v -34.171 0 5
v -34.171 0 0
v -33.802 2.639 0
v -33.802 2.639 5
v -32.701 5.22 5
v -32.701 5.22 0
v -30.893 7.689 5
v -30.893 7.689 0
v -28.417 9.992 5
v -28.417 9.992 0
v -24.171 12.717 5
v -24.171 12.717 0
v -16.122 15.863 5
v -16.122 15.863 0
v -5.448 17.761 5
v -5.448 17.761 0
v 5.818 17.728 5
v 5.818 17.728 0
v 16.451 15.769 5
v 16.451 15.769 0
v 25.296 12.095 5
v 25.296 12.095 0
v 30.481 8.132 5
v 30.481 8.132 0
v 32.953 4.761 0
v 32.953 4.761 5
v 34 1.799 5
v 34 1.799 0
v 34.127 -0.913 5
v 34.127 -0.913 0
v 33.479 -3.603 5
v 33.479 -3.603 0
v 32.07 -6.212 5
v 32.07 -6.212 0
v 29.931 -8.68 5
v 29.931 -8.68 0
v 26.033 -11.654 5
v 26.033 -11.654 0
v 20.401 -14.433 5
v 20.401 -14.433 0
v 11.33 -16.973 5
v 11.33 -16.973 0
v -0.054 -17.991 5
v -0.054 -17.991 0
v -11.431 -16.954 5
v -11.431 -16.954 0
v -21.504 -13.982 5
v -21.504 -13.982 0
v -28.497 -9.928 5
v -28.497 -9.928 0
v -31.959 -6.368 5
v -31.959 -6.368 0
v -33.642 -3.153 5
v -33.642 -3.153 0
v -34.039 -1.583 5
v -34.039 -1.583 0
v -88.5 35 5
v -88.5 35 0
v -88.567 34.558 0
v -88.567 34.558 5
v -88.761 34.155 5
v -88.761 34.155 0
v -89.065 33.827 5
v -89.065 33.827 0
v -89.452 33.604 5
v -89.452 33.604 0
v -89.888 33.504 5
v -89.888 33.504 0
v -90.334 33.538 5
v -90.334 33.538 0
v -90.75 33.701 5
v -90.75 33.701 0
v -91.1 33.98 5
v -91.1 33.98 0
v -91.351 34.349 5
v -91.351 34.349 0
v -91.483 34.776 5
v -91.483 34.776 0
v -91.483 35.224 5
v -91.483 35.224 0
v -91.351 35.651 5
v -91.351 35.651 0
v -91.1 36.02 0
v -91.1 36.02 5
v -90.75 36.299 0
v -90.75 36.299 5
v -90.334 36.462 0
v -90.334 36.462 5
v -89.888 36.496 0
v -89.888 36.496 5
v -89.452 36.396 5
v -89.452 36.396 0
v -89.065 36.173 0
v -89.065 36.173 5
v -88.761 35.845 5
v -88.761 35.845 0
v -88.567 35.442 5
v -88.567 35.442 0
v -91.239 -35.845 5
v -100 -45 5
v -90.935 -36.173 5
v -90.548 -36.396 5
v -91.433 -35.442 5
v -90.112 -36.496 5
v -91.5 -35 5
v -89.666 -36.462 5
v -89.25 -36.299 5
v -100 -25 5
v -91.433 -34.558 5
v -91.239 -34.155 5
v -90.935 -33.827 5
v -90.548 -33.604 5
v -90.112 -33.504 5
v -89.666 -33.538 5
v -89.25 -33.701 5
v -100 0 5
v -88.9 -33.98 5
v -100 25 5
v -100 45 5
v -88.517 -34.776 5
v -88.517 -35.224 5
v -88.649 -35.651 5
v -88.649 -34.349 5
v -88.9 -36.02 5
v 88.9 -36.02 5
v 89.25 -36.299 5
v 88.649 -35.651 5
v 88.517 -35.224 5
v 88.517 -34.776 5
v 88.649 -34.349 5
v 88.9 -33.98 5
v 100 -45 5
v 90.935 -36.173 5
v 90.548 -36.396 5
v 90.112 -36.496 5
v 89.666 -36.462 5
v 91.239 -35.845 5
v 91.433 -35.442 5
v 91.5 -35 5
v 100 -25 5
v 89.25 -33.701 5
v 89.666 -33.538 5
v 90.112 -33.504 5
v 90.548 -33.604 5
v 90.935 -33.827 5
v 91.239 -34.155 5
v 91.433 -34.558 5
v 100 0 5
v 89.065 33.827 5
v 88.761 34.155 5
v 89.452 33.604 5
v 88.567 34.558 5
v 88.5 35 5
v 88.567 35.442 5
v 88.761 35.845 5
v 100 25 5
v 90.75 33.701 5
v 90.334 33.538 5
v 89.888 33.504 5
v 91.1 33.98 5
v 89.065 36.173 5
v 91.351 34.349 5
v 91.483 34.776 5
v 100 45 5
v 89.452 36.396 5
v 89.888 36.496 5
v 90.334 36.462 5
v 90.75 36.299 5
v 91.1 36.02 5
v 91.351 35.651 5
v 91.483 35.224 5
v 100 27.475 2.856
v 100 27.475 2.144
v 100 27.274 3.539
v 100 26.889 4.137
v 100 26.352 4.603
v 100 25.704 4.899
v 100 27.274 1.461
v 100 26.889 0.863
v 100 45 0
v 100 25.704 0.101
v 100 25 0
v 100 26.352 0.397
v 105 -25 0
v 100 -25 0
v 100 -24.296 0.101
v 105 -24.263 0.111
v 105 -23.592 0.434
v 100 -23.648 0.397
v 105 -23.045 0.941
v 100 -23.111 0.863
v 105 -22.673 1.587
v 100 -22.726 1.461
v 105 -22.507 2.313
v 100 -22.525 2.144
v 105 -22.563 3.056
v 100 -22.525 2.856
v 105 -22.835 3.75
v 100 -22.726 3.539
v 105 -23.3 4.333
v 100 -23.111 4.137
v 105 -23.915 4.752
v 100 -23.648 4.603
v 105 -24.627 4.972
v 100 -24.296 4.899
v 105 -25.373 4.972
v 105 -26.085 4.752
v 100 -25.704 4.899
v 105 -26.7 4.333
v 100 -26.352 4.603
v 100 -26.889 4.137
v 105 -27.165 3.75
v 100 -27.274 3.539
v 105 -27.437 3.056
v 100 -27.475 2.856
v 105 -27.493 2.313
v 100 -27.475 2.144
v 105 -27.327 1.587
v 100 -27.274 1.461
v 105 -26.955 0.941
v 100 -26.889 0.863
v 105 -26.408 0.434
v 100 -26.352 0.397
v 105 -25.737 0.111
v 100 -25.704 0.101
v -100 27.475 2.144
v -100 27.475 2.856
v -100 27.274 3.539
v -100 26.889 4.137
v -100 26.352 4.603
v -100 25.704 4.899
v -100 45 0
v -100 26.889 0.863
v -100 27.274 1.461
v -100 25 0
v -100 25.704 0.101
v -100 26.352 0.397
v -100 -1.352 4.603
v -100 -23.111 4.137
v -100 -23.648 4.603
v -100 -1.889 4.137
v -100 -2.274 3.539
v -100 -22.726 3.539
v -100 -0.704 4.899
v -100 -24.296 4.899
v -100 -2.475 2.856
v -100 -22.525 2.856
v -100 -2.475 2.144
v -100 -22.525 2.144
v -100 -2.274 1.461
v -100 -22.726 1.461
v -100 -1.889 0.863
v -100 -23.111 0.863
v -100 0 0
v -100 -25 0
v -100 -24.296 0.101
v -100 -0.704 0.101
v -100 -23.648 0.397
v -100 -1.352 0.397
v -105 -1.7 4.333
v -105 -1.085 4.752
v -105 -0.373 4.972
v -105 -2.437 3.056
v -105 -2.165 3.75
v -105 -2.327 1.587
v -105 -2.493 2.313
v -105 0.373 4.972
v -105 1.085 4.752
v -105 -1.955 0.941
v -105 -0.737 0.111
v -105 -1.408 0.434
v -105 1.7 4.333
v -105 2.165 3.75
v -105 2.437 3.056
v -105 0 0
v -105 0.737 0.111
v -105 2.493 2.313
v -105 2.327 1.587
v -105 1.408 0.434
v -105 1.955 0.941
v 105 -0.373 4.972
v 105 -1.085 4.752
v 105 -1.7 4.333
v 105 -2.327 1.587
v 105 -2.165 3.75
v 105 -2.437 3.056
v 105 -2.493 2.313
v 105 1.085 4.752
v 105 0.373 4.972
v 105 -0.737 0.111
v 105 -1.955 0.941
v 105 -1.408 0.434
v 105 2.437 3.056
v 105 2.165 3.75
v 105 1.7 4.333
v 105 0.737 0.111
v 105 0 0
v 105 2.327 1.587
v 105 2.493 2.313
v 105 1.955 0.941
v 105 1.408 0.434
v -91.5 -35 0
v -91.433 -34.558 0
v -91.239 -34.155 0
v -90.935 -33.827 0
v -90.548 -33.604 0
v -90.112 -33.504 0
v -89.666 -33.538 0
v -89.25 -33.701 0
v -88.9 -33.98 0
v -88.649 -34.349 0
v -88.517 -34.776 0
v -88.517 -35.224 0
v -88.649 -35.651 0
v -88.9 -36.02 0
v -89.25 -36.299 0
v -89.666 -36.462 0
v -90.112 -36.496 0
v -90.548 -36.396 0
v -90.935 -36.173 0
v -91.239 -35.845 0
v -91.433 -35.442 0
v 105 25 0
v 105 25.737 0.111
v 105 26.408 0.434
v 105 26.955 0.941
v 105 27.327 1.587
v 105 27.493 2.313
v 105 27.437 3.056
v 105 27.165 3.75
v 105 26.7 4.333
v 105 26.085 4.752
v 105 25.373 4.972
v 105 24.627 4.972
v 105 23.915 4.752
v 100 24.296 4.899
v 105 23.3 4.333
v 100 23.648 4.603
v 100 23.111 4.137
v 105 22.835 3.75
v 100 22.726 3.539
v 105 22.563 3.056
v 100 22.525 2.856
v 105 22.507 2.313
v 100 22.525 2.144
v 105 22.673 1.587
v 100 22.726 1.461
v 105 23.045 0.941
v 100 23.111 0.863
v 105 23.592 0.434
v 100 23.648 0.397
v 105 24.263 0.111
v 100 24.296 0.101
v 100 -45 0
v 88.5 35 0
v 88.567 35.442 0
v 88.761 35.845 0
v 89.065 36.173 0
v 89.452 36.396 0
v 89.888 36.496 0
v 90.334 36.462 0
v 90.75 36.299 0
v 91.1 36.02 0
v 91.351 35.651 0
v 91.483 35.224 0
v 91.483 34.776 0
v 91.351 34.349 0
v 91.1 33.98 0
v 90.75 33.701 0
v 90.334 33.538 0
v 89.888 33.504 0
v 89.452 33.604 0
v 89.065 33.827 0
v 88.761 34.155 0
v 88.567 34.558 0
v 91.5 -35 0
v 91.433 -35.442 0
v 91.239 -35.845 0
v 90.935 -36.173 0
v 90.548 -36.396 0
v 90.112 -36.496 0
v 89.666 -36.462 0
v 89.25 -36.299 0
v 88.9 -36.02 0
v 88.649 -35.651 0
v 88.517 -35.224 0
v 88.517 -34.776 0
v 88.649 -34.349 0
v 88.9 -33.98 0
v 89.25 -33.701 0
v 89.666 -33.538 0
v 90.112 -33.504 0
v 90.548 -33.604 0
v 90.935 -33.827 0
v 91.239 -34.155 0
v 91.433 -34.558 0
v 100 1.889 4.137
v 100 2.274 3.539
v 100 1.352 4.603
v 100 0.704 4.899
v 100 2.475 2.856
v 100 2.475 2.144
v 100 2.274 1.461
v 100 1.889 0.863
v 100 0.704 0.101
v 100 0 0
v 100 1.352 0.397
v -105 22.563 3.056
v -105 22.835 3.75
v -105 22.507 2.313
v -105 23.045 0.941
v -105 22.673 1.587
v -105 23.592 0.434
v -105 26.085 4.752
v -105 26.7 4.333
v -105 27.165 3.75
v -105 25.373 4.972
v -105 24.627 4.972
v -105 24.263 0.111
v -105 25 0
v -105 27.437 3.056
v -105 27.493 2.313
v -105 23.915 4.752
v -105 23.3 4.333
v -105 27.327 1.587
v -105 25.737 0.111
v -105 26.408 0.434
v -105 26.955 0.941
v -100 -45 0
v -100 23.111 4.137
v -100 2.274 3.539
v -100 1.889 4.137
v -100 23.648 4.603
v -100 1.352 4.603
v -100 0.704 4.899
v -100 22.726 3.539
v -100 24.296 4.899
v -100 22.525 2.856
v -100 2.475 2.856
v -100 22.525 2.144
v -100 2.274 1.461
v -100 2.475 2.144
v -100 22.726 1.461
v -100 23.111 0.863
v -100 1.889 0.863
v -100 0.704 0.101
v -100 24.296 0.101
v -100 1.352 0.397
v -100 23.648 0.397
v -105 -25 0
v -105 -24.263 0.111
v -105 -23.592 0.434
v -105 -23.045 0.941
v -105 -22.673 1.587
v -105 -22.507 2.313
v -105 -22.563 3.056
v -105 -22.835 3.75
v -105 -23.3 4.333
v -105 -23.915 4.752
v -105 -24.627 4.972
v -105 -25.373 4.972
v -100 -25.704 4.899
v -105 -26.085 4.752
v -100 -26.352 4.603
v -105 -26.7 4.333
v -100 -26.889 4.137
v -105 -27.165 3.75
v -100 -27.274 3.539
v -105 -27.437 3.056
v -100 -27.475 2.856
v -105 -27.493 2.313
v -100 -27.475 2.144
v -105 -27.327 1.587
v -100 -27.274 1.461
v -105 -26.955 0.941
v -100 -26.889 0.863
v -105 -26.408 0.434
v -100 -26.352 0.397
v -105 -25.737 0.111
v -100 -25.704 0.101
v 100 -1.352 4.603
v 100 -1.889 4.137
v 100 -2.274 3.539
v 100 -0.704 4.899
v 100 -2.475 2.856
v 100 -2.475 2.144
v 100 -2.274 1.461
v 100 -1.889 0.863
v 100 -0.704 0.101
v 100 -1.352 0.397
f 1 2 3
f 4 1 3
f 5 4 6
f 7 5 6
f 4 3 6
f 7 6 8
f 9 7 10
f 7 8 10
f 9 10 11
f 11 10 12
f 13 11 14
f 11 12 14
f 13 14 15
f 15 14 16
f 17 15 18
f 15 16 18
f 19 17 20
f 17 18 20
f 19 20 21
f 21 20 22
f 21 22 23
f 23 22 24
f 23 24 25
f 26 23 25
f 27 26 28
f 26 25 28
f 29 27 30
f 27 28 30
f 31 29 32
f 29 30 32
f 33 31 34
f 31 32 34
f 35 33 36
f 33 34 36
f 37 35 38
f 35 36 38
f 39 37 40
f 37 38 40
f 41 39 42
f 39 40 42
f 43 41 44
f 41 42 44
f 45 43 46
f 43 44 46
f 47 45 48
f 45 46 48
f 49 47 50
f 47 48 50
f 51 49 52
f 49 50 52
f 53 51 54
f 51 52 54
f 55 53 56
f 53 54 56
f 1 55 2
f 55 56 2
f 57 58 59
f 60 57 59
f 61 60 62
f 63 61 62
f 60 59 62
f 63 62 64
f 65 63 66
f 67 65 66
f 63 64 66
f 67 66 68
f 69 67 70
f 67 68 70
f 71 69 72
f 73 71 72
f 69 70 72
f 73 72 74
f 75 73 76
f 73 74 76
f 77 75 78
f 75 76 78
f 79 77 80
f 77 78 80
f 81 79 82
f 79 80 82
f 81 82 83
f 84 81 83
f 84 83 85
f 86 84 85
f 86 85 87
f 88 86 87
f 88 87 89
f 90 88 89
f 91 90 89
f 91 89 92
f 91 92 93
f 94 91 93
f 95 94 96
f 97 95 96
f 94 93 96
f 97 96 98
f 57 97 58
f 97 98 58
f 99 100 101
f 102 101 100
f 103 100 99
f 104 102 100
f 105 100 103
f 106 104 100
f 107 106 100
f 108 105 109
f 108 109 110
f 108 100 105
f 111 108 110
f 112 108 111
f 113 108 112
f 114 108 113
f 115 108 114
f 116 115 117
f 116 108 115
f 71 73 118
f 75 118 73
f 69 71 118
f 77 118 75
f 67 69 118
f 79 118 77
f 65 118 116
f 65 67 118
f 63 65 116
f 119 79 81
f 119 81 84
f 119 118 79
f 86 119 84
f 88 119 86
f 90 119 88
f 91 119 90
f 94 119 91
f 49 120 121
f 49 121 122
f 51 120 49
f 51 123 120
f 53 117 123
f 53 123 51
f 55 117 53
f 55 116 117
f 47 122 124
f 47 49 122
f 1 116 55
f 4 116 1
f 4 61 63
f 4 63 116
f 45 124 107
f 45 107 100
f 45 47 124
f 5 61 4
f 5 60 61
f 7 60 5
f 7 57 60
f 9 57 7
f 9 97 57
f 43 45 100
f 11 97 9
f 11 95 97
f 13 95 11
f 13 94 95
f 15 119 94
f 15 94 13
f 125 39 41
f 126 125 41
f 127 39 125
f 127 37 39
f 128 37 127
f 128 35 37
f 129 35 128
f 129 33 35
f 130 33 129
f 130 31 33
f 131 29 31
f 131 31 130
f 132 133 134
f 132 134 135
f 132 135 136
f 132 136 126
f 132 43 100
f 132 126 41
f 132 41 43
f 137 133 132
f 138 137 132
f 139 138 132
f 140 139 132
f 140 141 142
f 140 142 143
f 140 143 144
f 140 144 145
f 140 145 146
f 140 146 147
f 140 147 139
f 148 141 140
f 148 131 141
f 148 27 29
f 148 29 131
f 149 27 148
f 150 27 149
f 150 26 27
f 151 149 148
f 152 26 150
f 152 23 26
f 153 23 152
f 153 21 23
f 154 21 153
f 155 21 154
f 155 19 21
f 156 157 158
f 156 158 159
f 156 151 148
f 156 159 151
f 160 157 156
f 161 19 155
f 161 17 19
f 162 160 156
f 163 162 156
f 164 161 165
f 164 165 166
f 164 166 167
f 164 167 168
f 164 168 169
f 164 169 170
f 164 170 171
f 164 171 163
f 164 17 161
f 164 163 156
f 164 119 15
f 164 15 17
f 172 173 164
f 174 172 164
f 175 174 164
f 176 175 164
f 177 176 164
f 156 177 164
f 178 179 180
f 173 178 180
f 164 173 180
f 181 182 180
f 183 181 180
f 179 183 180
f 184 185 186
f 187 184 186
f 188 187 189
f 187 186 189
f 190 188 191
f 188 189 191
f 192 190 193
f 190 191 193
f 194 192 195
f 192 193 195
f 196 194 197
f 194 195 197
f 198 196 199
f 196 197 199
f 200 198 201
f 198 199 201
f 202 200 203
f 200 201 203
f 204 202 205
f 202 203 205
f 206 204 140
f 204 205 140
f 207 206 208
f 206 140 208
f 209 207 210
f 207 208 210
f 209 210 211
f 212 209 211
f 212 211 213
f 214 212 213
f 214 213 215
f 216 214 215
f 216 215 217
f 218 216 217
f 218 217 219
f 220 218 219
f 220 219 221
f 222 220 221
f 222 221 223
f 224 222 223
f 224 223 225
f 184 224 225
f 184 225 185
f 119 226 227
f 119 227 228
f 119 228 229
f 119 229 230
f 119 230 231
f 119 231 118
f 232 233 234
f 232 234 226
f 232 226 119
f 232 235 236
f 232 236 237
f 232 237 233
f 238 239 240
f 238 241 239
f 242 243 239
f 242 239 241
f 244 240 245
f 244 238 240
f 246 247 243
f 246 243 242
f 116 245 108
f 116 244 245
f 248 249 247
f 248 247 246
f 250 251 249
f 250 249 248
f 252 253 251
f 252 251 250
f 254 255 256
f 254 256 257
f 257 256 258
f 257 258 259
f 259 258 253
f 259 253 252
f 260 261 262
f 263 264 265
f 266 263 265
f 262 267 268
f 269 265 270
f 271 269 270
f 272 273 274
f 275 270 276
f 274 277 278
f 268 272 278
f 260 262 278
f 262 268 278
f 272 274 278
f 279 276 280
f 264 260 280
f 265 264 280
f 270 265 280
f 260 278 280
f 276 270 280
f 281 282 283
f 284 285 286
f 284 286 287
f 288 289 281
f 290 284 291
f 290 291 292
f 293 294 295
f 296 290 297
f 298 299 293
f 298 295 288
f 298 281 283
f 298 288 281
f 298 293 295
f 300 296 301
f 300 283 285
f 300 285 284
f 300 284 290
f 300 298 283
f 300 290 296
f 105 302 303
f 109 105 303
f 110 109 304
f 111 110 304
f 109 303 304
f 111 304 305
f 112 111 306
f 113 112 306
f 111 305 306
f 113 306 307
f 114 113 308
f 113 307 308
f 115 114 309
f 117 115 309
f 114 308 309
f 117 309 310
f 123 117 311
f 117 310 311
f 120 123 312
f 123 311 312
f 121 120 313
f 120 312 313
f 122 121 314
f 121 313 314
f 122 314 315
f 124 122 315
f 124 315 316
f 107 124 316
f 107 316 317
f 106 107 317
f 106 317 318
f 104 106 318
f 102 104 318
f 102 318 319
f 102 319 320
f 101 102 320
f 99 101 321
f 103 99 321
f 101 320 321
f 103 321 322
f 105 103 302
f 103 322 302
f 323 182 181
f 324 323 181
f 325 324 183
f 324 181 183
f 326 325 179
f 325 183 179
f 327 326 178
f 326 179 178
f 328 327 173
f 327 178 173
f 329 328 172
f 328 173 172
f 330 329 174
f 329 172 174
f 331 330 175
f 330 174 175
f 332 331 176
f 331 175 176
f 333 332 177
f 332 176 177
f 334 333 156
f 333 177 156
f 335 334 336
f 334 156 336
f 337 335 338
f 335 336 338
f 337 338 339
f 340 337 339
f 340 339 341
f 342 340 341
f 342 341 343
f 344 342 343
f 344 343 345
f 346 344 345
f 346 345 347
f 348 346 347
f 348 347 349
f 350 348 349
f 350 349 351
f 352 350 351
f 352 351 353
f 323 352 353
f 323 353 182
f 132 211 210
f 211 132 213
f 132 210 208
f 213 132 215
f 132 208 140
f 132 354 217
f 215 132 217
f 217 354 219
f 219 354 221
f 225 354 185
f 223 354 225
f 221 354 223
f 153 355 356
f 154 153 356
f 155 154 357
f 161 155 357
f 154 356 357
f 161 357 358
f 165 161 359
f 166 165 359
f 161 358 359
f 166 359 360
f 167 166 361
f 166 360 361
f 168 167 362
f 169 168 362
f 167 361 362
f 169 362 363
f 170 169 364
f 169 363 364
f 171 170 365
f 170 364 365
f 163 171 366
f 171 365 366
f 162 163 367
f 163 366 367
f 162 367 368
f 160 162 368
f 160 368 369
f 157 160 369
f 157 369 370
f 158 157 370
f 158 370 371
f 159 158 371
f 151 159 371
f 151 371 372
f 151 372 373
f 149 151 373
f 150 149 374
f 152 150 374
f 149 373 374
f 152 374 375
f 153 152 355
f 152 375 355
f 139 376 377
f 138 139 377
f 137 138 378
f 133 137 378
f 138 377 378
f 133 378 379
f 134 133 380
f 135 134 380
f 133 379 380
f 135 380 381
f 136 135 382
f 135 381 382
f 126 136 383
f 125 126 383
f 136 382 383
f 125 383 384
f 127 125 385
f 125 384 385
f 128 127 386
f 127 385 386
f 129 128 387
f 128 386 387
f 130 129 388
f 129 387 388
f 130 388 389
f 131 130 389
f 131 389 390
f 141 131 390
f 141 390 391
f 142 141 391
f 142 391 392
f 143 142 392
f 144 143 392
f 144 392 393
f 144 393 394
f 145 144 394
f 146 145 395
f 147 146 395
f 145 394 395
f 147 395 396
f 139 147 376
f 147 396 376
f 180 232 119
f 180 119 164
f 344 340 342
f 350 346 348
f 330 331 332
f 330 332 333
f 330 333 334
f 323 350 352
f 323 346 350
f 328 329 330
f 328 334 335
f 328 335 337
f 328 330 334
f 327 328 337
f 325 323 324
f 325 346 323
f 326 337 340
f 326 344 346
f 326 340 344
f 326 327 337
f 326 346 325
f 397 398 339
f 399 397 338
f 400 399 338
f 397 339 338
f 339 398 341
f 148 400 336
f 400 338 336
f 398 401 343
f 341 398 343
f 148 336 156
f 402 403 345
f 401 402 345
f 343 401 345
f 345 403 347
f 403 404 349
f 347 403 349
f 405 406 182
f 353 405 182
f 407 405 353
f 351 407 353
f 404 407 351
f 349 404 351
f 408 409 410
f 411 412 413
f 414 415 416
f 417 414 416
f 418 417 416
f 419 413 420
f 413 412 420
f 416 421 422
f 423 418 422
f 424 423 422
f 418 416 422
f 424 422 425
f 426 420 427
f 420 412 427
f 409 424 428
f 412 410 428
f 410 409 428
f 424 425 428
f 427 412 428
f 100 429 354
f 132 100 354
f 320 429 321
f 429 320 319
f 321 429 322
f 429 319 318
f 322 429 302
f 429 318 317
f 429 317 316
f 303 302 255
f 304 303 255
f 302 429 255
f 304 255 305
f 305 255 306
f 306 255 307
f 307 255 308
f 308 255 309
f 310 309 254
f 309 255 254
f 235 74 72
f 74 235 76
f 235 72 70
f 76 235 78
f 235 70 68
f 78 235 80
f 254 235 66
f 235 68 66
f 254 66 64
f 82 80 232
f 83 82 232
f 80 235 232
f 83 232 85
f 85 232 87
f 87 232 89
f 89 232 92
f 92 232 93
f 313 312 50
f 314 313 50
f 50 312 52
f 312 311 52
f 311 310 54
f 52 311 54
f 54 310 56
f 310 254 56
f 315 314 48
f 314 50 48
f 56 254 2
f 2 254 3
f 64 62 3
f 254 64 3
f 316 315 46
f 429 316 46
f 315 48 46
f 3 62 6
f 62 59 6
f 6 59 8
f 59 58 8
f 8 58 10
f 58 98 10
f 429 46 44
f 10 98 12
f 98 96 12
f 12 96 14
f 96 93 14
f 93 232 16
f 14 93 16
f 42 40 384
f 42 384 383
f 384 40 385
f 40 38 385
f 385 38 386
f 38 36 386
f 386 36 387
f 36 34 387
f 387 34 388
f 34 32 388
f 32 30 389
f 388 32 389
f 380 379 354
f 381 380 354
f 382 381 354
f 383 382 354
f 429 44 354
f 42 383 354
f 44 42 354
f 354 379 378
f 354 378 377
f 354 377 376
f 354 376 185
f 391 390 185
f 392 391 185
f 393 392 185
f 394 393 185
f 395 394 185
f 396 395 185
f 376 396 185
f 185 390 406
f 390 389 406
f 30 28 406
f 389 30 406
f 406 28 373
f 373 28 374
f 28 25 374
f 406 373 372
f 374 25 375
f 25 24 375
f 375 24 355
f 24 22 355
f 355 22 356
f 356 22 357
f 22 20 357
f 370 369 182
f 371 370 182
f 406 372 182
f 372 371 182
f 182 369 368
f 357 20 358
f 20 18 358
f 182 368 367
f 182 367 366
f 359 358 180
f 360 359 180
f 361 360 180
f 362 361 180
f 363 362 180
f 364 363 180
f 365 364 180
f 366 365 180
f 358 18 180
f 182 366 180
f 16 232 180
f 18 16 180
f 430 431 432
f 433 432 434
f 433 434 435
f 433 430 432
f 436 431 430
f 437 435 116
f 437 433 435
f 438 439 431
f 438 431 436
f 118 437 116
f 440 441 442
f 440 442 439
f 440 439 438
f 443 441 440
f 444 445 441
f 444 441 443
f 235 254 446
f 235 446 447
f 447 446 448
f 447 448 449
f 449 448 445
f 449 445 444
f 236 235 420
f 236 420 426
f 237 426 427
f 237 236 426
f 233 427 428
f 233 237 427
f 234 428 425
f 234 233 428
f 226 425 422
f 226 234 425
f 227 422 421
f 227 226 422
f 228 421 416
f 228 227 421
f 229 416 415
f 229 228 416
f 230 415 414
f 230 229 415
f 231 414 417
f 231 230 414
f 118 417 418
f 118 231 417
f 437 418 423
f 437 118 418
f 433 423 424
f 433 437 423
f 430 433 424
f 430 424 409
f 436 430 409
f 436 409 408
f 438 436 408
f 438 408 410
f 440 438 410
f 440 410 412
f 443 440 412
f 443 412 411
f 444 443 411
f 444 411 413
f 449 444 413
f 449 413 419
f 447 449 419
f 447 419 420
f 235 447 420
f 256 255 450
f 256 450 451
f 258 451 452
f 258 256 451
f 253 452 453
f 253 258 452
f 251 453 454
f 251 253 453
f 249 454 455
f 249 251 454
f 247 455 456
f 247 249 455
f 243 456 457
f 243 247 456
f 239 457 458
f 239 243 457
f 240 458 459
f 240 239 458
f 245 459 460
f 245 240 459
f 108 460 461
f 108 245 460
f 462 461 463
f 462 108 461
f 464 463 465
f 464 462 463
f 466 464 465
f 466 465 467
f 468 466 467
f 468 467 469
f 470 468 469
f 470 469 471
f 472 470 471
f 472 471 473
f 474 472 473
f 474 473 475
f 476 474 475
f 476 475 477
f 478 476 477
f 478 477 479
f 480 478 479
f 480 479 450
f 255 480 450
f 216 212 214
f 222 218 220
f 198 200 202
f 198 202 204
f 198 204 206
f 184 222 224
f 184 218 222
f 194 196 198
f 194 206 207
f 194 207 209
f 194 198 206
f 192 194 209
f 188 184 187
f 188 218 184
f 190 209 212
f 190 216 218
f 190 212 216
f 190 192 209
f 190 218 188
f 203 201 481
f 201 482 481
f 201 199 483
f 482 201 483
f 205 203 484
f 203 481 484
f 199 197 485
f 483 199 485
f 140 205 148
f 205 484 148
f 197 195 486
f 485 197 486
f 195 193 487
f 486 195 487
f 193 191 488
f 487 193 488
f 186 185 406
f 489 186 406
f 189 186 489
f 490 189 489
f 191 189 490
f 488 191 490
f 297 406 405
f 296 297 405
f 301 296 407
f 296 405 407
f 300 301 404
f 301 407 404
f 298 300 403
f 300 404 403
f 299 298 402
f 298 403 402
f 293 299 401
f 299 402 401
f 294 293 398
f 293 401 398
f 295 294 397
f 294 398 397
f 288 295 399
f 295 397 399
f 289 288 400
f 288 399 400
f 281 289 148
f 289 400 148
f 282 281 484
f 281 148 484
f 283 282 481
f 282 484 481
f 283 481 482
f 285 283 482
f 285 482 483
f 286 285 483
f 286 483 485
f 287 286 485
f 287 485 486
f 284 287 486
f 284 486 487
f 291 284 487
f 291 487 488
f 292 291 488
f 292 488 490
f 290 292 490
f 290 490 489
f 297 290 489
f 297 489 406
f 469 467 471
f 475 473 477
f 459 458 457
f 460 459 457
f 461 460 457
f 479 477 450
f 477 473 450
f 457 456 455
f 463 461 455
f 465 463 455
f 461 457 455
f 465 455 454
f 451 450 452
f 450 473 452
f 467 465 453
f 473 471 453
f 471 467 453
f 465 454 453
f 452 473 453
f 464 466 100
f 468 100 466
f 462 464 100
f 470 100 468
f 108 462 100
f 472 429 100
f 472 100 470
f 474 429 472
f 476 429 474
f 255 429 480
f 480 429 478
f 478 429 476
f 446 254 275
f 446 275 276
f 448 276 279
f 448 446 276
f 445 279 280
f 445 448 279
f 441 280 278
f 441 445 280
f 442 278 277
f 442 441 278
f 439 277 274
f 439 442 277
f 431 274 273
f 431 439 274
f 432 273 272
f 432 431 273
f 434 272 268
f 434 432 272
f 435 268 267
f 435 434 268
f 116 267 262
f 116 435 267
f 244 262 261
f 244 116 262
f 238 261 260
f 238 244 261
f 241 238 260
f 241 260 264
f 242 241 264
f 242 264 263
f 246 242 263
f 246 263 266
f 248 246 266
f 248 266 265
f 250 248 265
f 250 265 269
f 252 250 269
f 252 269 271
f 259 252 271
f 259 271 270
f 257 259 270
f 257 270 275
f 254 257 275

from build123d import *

# Parameters (mm, degrees)
SKETCH1_W           = 200
SKETCH1_H           = 90
BOSS_EXTRUDE1_DEPTH = 5
SKETCH2_R           = 2.5
BOSS_EXTRUDE2_DEPTH = 5
SKETCH3_R           = 1.5
SKETCH3_RX          = 34.171351791
SKETCH3_RY          = 17.990877267
CUT_EXTRUDE1_DEPTH  = 5


with BuildPart() as part:
    # Sketch1 → Boss-Extrude1 (new body)
    with BuildSketch(Plane.XY):
        Rectangle(SKETCH1_W, SKETCH1_H)
    extrude(amount=BOSS_EXTRUDE1_DEPTH)

    # Sketch2 → Boss-Extrude2 (add)
    with BuildSketch(Plane(origin=(100, 0, 0), x_dir=(0, 0, -1), z_dir=(1, 0, 0))):
        with Locations((-2.5, 25)):
            Circle(SKETCH2_R)
        with Locations((-2.5, 0)):
            Circle(SKETCH2_R)
        with Locations((-2.5, -25)):
            Circle(SKETCH2_R)
    boss_extrude2 = extrude(amount=BOSS_EXTRUDE2_DEPTH)

    # Mirror1: Boss-Extrude2 across plane
    add(boss_extrude2.mirror(Plane(origin=(0, 0, 0), x_dir=(0, 0, 1), z_dir=(1, 0, 0))))

    # Sketch3 → Cut-Extrude1 (cut)
    with BuildSketch(Plane(origin=(0, 0, 0), x_dir=(-1, 0, 0), z_dir=(0, 0, -1))):
        with Locations((-90, 35)):
            Circle(SKETCH3_R)
        with Locations(Location((-90, -35, 0), (0, 0, 180))):
            Circle(SKETCH3_R)
        with Locations((90, -35)):
            Circle(SKETCH3_R)
        with Locations(Location((90, 35, 0), (0, 0, 180))):
            Circle(SKETCH3_R)
        with Locations((0, 0)):
            Ellipse(SKETCH3_RX, SKETCH3_RY)
    extrude(amount=-CUT_EXTRUDE1_DEPTH, mode=Mode.SUBTRACT)


solid = part.part
